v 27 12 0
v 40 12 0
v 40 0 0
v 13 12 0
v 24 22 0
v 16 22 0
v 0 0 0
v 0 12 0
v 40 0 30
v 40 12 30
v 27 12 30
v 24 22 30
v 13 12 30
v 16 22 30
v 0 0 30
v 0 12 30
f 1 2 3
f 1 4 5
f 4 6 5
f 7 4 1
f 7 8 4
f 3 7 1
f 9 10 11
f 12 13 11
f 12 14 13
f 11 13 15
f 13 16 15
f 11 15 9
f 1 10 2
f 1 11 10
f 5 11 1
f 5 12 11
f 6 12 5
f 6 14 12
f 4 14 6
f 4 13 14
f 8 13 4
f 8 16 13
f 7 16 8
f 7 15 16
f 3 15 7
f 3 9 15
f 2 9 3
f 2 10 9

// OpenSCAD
$fn = 32;

// ----------------------------------------------------------------------
// V guide rail: dovetail, 40 mm wide
// ----------------------------------------------------------------------

// --- parameters (mm) ---
rail_w = 40;              // rail width, X
base_t = 12;              // base plate thickness
v_depth = 10;             // V feature depth / height
v_half_w = 7;             // half width of the V at the base face
plate_t = 30;             // rail length, Z (the extrusion height)
top_half_w = 4;           // half width at the dovetail top
fit_tol = 0.05;           // declared fit tolerance (prompt contract)
free_tol = 0.2;           // declared free tolerance (prompt contract)

dovetail_base = 2 * v_half_w;  // dovetail width at the base
dovetail_top = 2 * top_half_w;  // dovetail width at the top

profile = [[0, 0], [40, 0], [40, 12], [27, 12], [24, 22], [16, 22], [13, 12], [0, 12]];  // primary outline, 8 points, counter clockwise

// --- the one profile operation ---
linear_extrude(height = plate_t) polygon(points = profile);
